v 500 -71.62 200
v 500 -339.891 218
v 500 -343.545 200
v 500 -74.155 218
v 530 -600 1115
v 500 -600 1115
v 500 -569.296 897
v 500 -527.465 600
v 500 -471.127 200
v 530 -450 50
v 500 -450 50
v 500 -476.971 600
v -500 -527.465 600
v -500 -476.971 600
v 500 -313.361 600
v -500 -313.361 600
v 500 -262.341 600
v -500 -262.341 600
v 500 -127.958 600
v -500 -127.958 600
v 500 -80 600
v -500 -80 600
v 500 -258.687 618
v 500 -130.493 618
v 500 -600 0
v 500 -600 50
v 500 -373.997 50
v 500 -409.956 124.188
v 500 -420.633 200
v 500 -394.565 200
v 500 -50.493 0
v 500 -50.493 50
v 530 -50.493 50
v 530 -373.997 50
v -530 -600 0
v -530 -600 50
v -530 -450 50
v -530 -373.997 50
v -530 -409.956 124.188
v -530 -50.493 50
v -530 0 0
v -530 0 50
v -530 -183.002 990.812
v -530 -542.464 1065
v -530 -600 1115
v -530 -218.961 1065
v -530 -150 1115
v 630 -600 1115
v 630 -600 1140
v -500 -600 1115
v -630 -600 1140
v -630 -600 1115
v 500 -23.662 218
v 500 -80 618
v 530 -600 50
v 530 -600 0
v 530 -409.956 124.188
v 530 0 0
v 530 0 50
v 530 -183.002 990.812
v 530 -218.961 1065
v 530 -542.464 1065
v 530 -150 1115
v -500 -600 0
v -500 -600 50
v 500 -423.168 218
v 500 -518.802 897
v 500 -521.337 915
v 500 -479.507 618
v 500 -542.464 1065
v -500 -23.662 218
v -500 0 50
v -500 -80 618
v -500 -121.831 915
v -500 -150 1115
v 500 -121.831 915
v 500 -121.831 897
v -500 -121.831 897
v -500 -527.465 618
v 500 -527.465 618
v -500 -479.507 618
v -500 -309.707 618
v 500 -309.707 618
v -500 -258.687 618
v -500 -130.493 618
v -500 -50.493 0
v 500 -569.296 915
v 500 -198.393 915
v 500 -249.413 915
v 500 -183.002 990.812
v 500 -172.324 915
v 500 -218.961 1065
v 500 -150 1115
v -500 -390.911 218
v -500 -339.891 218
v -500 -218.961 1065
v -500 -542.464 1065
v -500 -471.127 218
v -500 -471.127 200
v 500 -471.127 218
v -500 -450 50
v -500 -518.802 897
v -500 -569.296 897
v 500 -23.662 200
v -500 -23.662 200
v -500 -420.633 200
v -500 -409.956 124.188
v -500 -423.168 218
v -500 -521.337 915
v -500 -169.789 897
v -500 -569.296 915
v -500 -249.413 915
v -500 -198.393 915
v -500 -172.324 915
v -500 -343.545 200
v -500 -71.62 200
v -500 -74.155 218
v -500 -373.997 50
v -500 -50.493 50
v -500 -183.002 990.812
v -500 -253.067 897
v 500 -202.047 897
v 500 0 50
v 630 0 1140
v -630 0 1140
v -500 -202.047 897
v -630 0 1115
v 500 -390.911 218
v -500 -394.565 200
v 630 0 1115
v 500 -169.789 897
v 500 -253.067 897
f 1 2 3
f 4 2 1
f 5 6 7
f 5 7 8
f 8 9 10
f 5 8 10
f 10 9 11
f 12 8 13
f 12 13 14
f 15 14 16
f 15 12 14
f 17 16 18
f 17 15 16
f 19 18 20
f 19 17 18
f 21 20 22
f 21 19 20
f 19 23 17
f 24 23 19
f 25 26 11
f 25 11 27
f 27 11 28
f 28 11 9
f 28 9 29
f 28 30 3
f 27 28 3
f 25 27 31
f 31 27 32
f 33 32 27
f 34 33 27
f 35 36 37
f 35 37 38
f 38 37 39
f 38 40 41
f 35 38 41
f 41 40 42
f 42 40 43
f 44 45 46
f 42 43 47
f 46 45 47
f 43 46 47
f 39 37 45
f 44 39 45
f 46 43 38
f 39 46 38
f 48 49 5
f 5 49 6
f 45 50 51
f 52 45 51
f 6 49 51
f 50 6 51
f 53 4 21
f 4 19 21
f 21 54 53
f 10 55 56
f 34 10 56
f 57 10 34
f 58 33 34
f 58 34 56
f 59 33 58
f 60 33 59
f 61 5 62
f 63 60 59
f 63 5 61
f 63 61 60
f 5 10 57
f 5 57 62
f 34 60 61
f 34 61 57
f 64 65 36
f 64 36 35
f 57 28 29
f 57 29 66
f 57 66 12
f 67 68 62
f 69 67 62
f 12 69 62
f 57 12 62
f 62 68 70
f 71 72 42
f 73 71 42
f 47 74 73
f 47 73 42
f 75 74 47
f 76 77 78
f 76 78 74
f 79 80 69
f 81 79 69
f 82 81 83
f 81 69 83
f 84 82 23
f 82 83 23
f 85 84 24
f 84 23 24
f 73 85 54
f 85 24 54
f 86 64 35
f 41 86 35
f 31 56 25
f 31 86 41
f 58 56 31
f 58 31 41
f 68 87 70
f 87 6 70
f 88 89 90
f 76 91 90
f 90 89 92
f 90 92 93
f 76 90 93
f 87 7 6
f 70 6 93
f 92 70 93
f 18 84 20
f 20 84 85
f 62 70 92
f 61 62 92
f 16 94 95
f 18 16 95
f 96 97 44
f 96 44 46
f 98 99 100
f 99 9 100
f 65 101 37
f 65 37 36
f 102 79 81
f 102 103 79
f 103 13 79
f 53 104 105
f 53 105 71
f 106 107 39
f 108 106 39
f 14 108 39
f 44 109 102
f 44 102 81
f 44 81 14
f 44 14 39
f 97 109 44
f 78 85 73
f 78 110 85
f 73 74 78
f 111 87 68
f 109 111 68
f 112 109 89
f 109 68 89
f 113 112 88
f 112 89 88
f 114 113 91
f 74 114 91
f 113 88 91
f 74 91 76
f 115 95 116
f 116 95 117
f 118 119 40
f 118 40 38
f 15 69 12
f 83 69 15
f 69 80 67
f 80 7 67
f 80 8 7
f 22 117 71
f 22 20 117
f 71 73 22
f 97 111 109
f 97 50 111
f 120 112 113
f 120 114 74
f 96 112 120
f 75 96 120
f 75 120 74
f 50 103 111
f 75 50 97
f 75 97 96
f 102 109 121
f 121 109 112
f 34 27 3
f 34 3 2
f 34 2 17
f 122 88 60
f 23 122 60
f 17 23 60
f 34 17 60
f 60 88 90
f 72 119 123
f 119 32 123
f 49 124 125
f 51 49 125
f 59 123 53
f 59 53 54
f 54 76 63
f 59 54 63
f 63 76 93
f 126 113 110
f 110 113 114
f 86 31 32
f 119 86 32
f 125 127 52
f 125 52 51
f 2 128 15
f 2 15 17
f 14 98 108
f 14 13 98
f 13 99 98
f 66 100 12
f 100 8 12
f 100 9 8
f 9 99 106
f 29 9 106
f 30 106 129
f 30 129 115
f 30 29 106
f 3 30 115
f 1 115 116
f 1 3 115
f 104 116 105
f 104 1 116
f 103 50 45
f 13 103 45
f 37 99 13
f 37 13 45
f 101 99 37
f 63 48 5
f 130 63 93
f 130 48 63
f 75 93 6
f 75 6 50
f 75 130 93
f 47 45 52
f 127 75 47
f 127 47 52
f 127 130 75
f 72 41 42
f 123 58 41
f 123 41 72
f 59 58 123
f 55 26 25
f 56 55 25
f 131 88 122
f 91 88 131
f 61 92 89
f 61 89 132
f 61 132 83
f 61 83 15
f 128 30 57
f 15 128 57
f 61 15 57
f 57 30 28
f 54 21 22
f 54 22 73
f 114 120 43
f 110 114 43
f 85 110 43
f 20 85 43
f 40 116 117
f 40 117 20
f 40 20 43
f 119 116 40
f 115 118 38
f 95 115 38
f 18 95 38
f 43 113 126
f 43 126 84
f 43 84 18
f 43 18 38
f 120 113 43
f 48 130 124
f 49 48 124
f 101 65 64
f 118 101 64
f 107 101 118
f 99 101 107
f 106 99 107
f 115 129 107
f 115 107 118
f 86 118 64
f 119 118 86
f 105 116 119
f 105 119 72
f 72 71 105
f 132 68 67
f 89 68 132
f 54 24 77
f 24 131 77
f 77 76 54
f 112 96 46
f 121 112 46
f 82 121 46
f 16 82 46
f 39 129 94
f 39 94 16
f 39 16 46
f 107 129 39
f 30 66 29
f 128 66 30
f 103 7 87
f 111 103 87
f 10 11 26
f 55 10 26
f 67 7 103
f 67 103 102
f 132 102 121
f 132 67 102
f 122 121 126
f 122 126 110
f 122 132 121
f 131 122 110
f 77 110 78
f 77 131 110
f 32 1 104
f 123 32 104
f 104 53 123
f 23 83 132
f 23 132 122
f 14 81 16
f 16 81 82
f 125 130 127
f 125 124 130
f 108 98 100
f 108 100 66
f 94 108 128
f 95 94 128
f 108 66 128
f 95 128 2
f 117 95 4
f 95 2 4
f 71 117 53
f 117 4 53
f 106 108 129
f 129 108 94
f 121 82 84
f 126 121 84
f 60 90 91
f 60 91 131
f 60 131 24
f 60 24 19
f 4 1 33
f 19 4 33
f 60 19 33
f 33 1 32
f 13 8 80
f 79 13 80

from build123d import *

# Parameters (mm, degrees)
F2_DEPTH = 30
F3_W     = 630
F3_H     = 25
F4_DEPTH = 600
F5_W     = 447.4647887324
F5_H     = 18
F6_DEPTH = 500
F7_W     = 50.4934979443
F7_H     = 50
F8_DEPTH = 500


with BuildPart() as f2:
    # F1 (on offset) → F2 (new body)
    with BuildSketch(Plane.YZ.offset(500)):
        Polygon((-600, 50), (-600, 0), (0, 0), (0, 50), (-150, 1115), (-600, 1115), (-450, 50), align=None)
        Polygon((-50.4934979443, 50), (-373.9965395023, 50), (-183.0022161165, 990.8118990221), align=None, mode=Mode.SUBTRACT)
        Polygon((-409.9555303624, 124.1881009779), (-542.4642485345, 1065), (-218.9612069765, 1065), align=None, mode=Mode.SUBTRACT)
    extrude(amount=F2_DEPTH)

    # F3 (on Front) → F4 (join)
    with BuildSketch(Plane.XZ):
        with Locations((315, 1127.5)):
            Rectangle(F3_W, F3_H)
    extrude(amount=F4_DEPTH)

    # F5 (on Right) → F6 (join, through all)
    with BuildSketch(Plane.YZ):
        with Locations((-345.5633802817, 906)):
            Rectangle(F5_W, F5_H)
        with Locations((-303.7323943662, 609)):
            Rectangle(F5_W, F5_H)
        with Locations((-247.3943661972, 209)):
            Rectangle(F5_W, F5_H)
    extrude(amount=F6_DEPTH)

    # F7 (on Right) → F8 (join, through all)
    with BuildSketch(Plane.YZ):
        with Locations((-25.2467489722, 25)):
            Rectangle(F7_W, F7_H)
    extrude(amount=F8_DEPTH)

    # F9: F2 across plane


with BuildPart() as f2_1:
    add(f2.part)
    add(f2.part.mirror(Plane.YZ))


solid = f2_1.part
